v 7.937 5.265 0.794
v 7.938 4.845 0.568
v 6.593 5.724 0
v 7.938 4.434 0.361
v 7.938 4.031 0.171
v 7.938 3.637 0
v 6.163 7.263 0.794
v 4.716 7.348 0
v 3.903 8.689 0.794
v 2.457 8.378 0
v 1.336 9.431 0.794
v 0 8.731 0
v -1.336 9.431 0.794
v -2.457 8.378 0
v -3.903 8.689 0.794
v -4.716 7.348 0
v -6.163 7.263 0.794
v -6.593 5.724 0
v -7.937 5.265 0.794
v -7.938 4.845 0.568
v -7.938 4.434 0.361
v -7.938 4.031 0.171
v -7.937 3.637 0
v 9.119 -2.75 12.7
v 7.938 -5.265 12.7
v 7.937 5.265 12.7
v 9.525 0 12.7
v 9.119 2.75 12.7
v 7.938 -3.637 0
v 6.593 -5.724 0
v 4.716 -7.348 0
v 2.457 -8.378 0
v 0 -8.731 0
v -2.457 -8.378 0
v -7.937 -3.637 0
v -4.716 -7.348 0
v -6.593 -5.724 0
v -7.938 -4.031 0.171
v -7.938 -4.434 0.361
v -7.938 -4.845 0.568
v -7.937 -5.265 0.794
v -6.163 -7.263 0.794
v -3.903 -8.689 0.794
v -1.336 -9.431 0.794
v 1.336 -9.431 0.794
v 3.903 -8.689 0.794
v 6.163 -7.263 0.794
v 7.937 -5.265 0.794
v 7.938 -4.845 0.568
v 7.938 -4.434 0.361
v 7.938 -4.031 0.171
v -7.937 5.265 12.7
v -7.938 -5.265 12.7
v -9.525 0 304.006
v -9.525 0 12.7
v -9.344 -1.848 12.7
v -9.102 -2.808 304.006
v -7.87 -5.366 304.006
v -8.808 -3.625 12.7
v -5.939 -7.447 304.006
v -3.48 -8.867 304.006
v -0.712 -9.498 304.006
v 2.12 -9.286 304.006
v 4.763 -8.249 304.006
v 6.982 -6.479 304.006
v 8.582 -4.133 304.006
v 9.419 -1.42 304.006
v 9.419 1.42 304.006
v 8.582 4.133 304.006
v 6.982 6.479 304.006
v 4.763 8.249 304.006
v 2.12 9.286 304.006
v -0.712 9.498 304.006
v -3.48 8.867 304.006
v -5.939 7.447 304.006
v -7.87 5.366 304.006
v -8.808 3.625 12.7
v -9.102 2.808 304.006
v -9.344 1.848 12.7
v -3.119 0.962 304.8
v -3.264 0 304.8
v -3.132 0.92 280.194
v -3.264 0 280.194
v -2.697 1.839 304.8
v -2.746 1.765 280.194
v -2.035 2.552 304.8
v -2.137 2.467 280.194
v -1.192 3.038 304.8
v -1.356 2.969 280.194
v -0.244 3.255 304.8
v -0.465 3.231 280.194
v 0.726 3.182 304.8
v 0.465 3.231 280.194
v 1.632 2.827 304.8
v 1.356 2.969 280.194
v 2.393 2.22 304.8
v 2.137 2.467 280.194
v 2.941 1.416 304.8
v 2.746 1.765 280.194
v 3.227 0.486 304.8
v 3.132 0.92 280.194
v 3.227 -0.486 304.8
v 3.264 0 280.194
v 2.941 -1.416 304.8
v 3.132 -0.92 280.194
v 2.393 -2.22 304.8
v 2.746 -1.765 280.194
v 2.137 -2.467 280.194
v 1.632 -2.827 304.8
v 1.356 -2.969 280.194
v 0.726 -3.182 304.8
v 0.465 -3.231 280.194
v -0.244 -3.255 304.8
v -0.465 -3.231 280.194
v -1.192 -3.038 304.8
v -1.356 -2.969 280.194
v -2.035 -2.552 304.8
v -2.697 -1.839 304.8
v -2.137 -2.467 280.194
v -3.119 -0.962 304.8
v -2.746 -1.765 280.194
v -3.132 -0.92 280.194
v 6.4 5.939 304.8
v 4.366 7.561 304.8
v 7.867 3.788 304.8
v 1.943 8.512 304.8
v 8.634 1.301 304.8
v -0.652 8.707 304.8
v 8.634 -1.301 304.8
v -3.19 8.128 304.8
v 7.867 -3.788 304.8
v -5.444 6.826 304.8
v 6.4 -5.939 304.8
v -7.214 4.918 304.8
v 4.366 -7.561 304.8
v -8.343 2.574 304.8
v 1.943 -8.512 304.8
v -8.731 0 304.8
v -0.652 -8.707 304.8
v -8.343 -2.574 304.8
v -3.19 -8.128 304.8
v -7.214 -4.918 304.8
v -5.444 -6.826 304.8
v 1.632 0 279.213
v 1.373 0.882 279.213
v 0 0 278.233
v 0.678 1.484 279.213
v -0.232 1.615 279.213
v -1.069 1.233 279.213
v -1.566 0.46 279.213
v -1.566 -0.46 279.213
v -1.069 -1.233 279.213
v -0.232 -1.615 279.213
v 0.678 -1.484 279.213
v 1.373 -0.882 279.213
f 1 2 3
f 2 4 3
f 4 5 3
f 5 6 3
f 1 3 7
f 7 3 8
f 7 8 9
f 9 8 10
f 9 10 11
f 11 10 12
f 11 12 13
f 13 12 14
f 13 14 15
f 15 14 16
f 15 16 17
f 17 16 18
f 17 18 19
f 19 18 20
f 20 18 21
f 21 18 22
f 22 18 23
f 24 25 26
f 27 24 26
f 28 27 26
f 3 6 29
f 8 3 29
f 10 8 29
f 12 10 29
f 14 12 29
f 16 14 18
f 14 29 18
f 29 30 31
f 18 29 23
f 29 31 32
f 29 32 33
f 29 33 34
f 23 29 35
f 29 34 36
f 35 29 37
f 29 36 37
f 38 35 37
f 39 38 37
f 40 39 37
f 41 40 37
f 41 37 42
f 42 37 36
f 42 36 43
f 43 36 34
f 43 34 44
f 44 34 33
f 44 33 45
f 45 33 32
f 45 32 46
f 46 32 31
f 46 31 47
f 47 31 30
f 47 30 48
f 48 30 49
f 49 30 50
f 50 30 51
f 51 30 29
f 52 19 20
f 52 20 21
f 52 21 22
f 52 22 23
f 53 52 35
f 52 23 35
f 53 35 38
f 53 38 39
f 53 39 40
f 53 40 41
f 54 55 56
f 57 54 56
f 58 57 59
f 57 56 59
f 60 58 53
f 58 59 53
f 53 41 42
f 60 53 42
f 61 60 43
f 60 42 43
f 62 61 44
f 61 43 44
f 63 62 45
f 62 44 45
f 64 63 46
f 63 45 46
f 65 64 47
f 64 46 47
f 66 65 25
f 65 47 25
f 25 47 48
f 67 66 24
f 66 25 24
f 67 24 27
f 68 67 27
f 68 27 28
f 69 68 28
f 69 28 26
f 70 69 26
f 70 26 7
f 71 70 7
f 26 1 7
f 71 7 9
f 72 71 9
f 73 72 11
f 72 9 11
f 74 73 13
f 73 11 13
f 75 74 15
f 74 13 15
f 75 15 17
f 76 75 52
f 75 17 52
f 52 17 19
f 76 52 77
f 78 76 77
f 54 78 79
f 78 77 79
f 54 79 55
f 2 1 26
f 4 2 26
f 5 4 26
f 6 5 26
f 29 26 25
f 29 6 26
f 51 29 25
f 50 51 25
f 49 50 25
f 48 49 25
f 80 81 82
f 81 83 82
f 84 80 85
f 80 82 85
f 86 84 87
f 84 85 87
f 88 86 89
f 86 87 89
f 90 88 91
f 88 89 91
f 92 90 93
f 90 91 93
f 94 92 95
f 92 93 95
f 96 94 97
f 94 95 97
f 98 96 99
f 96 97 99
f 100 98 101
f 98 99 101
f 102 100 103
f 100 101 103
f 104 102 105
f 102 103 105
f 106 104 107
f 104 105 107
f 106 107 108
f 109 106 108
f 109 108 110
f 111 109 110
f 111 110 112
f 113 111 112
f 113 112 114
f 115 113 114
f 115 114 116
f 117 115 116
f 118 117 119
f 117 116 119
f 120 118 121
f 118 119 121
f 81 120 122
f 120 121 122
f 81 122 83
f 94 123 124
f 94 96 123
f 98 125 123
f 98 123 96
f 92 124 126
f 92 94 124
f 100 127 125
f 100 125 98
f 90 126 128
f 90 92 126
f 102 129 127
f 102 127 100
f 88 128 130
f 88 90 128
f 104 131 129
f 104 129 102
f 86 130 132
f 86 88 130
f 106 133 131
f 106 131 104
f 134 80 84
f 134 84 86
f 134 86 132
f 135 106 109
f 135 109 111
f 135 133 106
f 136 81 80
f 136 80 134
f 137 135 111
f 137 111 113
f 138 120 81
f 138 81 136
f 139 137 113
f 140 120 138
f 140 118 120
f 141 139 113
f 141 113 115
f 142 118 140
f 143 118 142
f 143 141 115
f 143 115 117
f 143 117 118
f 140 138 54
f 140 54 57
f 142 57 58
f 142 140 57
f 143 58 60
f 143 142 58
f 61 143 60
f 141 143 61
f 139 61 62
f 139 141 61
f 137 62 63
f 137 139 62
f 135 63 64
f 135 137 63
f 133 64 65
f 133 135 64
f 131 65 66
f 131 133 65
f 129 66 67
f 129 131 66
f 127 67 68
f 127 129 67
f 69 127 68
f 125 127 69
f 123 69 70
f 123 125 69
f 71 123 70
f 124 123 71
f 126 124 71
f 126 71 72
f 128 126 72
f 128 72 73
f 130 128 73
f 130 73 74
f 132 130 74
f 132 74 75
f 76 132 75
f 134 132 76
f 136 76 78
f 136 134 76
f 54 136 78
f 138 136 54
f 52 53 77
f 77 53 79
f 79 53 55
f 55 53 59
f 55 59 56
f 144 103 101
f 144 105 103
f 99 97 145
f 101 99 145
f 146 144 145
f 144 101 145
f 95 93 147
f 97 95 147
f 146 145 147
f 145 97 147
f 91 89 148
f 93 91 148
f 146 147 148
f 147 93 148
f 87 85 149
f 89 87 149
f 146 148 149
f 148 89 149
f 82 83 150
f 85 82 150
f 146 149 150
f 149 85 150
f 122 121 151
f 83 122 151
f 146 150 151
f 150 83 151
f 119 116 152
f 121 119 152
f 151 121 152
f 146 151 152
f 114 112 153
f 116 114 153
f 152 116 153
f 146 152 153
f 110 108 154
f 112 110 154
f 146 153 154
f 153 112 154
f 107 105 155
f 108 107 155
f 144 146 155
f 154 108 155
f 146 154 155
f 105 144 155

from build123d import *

# Parameters (mm, degrees)
SKETCH1_R                    = 9.525
EXTRUDE1_DEPTH               = 304.8
CHAMFER1_SIZE                = 0.79375
F_5_16_18_TAPPED_HOLE1_D     = 6.5278
F_5_16_18_TAPPED_HOLE1_DEPTH = 24.6063008
F_5_16_18_TAPPED_HOLE1_TIP   = 1.961148974
CUT_EXTRUDE1_DEPTH           = 12.7


with BuildPart() as part:
    # Sketch1 → Extrude1 (new body)
    with BuildSketch(Plane.XY):
        with Locations(Location((0, 0, 0), (0, 0, 180))):
            Circle(SKETCH1_R)
    extrude(amount=EXTRUDE1_DEPTH)

    # Chamfer1
    chamfer1_edges = [part.edges().sort_by_distance(p)[0] for p in [
        (9.525, 0, 0),
        (9.525, 0, 304.8),
    ]]
    chamfer(chamfer1_edges, length=CHAMFER1_SIZE)

    # 5/16-18 Tapped Hole1
    with Locations(Plane.XY.offset(304.8)):
        with Locations((0, 0)):
            Hole(F_5_16_18_TAPPED_HOLE1_D / 2, depth=F_5_16_18_TAPPED_HOLE1_DEPTH)
            with Locations((0, 0, -(F_5_16_18_TAPPED_HOLE1_DEPTH + F_5_16_18_TAPPED_HOLE1_TIP / 2))):  # 118° drill point
                Cone(0, F_5_16_18_TAPPED_HOLE1_D / 2, F_5_16_18_TAPPED_HOLE1_TIP, mode=Mode.SUBTRACT)

    # Sketch4 → Cut-Extrude1 (cut)
    with BuildSketch(Plane(origin=(0, 0, 0), x_dir=(-1, 0, 0), z_dir=(0, 0, -1))):
        with BuildLine():
            Line((-7.9375, 5.265141855), (-7.9375, -5.265141855))
            ThreePointArc((-7.9375, -5.265141855), (-9.525, 0), (-7.9375, 5.265141855))
        make_face()
        with BuildLine():
            Line((7.9375, 5.265141855), (7.9375, -5.265141855))
            ThreePointArc((7.9375, -5.265141855), (9.525, 0), (7.9375, 5.265141855))
        make_face()
    extrude(amount=-CUT_EXTRUDE1_DEPTH, mode=Mode.SUBTRACT)


solid = part.part
